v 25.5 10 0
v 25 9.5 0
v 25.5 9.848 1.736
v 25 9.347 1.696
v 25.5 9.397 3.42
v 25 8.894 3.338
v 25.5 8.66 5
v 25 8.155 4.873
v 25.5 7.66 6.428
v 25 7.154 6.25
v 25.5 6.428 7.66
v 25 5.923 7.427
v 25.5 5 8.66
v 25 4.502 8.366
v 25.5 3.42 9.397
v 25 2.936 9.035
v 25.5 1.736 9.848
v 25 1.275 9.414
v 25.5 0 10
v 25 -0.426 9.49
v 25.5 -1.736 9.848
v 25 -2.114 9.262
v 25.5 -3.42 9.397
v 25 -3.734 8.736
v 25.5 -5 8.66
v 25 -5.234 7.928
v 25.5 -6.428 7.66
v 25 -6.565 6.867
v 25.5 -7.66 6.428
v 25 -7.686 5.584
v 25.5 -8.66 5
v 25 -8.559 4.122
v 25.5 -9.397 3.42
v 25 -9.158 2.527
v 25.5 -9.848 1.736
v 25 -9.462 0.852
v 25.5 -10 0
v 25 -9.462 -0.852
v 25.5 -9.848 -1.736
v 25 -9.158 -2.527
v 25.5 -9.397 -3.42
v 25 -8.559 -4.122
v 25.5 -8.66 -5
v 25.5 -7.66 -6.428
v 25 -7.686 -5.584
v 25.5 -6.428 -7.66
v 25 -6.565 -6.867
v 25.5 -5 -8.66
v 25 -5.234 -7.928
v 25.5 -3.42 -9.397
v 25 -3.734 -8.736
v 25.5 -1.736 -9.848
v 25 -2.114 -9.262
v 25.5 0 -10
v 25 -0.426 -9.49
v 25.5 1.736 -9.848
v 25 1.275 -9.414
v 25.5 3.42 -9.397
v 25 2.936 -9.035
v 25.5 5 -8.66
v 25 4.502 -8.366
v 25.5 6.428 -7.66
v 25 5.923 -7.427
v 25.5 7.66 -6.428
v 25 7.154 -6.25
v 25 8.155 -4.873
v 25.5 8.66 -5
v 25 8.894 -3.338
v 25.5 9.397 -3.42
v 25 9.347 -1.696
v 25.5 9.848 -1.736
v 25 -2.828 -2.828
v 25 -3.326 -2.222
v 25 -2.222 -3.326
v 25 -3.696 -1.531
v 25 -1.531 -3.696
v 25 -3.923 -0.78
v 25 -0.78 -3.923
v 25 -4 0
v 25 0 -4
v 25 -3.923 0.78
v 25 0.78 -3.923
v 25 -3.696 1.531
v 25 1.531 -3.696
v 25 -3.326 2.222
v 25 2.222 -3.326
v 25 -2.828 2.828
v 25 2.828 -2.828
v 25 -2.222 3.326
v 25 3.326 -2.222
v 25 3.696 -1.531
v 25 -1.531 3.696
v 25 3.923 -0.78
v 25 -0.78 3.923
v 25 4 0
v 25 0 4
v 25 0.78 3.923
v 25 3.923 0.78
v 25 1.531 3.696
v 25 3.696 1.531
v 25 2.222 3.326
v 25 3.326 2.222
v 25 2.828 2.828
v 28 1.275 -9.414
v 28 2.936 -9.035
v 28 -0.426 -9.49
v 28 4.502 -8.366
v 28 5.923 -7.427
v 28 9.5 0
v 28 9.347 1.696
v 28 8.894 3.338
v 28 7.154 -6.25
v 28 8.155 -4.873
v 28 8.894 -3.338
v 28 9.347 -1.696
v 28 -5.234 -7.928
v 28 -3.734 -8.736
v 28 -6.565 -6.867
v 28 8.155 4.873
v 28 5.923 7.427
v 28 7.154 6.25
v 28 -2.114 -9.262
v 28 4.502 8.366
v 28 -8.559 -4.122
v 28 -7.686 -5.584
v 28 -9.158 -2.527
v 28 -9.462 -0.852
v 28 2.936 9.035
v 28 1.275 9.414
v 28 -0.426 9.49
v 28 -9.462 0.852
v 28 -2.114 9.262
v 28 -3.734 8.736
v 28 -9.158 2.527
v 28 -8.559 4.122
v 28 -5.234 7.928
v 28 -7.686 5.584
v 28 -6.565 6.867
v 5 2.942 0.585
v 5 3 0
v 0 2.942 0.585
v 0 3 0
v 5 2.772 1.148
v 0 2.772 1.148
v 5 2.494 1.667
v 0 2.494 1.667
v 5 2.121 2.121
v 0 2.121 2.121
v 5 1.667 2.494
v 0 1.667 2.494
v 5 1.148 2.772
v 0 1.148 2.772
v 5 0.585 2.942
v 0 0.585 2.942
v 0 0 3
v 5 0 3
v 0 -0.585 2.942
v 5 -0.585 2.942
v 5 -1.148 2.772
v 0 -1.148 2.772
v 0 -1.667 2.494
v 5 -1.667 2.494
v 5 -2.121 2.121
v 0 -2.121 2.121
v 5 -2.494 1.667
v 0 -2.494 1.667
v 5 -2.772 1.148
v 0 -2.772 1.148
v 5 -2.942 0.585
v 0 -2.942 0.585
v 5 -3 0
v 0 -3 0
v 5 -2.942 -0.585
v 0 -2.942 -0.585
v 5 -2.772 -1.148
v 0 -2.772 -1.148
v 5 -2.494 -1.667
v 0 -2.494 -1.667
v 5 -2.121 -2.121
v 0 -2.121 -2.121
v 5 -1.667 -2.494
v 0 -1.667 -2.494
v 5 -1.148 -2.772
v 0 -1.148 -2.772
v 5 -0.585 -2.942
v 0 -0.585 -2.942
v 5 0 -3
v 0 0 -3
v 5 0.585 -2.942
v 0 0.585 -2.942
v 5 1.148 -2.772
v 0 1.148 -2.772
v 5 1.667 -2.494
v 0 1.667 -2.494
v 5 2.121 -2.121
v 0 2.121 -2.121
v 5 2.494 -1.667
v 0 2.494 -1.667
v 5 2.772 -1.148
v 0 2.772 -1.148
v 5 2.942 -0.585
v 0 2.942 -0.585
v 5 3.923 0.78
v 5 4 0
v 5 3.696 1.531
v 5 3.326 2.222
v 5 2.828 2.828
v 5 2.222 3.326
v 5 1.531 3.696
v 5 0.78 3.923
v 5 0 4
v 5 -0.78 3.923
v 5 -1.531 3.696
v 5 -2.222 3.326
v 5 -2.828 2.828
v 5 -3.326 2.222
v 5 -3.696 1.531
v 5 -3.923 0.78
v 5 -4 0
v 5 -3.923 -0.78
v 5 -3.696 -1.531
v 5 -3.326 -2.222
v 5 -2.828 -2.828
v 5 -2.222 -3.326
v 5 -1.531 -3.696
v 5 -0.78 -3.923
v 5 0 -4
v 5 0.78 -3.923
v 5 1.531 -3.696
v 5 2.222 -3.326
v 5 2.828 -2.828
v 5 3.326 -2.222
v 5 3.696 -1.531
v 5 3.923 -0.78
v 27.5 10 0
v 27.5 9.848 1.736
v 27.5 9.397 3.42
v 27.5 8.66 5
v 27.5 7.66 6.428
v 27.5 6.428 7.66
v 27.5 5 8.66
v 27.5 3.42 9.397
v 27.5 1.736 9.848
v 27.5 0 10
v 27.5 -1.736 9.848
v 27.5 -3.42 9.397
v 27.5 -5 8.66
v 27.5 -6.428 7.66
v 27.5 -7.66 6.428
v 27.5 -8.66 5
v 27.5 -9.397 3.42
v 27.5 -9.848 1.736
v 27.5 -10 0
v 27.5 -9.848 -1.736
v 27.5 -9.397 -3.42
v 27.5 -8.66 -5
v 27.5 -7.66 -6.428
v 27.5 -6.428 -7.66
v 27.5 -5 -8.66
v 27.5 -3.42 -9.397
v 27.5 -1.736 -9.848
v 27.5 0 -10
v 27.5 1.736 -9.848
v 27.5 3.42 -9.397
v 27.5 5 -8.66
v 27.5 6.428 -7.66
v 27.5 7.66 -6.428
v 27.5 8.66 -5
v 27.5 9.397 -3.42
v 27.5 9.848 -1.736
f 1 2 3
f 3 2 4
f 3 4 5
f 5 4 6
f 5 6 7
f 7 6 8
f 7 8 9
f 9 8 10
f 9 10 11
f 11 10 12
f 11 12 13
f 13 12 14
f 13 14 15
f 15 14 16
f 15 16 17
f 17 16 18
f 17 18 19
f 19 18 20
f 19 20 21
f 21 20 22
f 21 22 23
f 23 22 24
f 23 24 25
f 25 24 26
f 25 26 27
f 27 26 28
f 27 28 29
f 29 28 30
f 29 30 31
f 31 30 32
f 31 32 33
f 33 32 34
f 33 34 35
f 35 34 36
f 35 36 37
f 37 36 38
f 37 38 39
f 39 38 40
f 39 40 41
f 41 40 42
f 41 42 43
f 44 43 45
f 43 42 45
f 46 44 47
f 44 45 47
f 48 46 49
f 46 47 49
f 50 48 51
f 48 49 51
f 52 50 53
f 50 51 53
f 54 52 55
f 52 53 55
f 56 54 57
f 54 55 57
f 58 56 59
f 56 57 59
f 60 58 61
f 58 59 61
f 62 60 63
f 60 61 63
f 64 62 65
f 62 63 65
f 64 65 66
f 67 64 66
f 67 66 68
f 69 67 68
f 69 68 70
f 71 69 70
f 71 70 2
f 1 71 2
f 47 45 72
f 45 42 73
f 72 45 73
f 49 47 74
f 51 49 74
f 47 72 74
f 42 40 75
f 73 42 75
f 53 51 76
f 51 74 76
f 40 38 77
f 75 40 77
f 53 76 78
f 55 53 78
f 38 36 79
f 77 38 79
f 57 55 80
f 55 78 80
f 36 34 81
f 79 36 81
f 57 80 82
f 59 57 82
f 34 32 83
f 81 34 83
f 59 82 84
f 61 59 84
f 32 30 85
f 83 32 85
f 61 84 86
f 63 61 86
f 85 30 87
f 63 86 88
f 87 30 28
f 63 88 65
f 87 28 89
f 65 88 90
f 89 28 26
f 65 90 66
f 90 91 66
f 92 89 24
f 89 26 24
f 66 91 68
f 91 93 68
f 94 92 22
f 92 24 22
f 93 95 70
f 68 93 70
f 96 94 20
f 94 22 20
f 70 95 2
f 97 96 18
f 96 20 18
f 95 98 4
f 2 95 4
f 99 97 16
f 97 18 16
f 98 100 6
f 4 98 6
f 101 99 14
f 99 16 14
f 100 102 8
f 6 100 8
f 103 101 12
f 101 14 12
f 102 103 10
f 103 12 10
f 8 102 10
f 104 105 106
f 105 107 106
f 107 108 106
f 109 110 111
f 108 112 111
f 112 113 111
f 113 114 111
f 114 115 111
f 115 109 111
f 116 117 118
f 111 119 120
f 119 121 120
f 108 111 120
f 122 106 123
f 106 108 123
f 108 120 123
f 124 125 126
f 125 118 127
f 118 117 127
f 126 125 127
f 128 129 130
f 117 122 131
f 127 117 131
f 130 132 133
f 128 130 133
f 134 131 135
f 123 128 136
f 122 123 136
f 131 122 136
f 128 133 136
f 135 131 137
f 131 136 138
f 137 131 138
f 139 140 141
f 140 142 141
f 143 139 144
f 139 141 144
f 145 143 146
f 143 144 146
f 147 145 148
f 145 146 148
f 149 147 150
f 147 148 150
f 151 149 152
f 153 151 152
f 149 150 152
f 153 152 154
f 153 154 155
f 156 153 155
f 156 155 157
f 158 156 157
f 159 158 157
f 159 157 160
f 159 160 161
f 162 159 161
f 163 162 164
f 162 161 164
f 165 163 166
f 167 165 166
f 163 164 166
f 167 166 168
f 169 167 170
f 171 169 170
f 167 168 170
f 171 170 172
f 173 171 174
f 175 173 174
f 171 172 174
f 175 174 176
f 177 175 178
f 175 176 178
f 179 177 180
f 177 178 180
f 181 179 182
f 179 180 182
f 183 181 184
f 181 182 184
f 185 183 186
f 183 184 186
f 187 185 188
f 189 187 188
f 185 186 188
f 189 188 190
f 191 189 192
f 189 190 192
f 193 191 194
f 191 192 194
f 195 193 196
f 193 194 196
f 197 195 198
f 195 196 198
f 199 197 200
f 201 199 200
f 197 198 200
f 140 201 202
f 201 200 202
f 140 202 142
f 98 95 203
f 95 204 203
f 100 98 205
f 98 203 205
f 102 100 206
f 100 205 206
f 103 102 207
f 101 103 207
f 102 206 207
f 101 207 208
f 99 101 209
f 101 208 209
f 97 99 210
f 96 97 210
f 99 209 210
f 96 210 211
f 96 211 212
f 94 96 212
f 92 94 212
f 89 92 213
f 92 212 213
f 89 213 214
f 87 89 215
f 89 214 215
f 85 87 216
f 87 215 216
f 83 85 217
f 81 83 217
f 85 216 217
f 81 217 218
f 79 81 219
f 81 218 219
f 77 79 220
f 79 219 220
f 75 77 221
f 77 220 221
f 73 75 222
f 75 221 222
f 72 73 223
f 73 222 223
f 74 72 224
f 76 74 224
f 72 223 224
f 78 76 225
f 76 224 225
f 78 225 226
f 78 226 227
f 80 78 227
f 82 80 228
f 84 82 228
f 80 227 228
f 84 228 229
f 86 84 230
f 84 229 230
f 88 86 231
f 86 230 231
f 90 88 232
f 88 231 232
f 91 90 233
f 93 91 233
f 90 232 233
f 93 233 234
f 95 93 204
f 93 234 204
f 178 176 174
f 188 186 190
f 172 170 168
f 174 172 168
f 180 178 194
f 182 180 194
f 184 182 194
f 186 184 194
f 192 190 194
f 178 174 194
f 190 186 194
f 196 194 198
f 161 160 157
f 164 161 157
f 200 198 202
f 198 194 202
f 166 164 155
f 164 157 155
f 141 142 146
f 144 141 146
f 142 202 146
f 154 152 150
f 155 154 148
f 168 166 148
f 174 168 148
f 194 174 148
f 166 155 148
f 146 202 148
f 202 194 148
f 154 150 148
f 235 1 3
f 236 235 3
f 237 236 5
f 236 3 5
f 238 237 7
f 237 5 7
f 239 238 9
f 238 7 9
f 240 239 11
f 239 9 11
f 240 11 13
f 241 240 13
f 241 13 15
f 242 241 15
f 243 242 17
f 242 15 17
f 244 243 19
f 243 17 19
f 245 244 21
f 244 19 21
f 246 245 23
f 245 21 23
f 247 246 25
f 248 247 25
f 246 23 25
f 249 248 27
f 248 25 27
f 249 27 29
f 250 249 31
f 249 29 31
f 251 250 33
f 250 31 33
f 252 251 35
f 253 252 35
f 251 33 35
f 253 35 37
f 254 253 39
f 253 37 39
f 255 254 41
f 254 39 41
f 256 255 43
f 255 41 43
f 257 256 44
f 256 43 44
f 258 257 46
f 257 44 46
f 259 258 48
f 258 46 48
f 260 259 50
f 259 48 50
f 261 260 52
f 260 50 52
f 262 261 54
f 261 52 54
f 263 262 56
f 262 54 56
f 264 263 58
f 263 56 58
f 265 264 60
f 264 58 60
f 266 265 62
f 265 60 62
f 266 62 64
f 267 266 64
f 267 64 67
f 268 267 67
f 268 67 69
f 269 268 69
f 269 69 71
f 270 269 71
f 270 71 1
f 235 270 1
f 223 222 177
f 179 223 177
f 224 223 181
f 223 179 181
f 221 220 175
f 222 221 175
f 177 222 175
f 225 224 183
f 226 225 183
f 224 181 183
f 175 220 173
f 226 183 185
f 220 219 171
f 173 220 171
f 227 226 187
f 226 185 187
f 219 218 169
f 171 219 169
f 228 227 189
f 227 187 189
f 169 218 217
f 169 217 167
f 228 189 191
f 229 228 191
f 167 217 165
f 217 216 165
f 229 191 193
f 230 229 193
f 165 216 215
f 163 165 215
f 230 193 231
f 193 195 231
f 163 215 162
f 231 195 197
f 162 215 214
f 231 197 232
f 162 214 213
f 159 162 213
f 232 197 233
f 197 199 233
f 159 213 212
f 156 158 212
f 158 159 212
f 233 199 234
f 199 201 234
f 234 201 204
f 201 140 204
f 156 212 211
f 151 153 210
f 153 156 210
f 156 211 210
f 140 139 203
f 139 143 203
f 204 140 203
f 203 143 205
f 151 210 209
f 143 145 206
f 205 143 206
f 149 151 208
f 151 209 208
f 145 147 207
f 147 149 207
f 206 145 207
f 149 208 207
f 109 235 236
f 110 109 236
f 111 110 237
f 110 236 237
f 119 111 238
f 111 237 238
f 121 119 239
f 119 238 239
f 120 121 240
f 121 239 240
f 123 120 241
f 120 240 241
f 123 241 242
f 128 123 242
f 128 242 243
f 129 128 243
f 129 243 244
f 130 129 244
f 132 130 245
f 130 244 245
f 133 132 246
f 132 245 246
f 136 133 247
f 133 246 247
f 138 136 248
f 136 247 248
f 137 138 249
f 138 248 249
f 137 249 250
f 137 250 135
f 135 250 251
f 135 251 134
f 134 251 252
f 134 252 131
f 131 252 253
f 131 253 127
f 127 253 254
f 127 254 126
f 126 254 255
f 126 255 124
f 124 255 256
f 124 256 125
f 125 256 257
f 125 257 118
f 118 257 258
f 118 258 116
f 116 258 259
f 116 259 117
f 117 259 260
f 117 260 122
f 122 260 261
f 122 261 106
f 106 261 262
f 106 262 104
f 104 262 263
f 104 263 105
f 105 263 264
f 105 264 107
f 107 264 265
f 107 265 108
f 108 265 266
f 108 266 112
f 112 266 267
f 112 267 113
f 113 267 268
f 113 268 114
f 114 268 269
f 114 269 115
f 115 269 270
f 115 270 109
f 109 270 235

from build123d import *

# Parameters (mm, degrees)
F2_SIZE = 0.5


with BuildPart() as f1:
    # F0 (on Top) → F1 (revolve)
    with BuildSketch(Plane.XY):
        Polygon((0, 3), (0, 0), (28, 0), (28, 10), (25, 10), (25, 4), (5, 4), (5, 3), align=None)
    revolve(axis=Axis((27.980929, 0, 0), (1, 0, 0)))

    # F2
    f2_edges = [f1.edges().sort_by_distance(p)[0] for p in [
        (28, -10, 0),
        (25, -10, 0),
    ]]
    chamfer(f2_edges, length=F2_SIZE)


solid = f1.part
